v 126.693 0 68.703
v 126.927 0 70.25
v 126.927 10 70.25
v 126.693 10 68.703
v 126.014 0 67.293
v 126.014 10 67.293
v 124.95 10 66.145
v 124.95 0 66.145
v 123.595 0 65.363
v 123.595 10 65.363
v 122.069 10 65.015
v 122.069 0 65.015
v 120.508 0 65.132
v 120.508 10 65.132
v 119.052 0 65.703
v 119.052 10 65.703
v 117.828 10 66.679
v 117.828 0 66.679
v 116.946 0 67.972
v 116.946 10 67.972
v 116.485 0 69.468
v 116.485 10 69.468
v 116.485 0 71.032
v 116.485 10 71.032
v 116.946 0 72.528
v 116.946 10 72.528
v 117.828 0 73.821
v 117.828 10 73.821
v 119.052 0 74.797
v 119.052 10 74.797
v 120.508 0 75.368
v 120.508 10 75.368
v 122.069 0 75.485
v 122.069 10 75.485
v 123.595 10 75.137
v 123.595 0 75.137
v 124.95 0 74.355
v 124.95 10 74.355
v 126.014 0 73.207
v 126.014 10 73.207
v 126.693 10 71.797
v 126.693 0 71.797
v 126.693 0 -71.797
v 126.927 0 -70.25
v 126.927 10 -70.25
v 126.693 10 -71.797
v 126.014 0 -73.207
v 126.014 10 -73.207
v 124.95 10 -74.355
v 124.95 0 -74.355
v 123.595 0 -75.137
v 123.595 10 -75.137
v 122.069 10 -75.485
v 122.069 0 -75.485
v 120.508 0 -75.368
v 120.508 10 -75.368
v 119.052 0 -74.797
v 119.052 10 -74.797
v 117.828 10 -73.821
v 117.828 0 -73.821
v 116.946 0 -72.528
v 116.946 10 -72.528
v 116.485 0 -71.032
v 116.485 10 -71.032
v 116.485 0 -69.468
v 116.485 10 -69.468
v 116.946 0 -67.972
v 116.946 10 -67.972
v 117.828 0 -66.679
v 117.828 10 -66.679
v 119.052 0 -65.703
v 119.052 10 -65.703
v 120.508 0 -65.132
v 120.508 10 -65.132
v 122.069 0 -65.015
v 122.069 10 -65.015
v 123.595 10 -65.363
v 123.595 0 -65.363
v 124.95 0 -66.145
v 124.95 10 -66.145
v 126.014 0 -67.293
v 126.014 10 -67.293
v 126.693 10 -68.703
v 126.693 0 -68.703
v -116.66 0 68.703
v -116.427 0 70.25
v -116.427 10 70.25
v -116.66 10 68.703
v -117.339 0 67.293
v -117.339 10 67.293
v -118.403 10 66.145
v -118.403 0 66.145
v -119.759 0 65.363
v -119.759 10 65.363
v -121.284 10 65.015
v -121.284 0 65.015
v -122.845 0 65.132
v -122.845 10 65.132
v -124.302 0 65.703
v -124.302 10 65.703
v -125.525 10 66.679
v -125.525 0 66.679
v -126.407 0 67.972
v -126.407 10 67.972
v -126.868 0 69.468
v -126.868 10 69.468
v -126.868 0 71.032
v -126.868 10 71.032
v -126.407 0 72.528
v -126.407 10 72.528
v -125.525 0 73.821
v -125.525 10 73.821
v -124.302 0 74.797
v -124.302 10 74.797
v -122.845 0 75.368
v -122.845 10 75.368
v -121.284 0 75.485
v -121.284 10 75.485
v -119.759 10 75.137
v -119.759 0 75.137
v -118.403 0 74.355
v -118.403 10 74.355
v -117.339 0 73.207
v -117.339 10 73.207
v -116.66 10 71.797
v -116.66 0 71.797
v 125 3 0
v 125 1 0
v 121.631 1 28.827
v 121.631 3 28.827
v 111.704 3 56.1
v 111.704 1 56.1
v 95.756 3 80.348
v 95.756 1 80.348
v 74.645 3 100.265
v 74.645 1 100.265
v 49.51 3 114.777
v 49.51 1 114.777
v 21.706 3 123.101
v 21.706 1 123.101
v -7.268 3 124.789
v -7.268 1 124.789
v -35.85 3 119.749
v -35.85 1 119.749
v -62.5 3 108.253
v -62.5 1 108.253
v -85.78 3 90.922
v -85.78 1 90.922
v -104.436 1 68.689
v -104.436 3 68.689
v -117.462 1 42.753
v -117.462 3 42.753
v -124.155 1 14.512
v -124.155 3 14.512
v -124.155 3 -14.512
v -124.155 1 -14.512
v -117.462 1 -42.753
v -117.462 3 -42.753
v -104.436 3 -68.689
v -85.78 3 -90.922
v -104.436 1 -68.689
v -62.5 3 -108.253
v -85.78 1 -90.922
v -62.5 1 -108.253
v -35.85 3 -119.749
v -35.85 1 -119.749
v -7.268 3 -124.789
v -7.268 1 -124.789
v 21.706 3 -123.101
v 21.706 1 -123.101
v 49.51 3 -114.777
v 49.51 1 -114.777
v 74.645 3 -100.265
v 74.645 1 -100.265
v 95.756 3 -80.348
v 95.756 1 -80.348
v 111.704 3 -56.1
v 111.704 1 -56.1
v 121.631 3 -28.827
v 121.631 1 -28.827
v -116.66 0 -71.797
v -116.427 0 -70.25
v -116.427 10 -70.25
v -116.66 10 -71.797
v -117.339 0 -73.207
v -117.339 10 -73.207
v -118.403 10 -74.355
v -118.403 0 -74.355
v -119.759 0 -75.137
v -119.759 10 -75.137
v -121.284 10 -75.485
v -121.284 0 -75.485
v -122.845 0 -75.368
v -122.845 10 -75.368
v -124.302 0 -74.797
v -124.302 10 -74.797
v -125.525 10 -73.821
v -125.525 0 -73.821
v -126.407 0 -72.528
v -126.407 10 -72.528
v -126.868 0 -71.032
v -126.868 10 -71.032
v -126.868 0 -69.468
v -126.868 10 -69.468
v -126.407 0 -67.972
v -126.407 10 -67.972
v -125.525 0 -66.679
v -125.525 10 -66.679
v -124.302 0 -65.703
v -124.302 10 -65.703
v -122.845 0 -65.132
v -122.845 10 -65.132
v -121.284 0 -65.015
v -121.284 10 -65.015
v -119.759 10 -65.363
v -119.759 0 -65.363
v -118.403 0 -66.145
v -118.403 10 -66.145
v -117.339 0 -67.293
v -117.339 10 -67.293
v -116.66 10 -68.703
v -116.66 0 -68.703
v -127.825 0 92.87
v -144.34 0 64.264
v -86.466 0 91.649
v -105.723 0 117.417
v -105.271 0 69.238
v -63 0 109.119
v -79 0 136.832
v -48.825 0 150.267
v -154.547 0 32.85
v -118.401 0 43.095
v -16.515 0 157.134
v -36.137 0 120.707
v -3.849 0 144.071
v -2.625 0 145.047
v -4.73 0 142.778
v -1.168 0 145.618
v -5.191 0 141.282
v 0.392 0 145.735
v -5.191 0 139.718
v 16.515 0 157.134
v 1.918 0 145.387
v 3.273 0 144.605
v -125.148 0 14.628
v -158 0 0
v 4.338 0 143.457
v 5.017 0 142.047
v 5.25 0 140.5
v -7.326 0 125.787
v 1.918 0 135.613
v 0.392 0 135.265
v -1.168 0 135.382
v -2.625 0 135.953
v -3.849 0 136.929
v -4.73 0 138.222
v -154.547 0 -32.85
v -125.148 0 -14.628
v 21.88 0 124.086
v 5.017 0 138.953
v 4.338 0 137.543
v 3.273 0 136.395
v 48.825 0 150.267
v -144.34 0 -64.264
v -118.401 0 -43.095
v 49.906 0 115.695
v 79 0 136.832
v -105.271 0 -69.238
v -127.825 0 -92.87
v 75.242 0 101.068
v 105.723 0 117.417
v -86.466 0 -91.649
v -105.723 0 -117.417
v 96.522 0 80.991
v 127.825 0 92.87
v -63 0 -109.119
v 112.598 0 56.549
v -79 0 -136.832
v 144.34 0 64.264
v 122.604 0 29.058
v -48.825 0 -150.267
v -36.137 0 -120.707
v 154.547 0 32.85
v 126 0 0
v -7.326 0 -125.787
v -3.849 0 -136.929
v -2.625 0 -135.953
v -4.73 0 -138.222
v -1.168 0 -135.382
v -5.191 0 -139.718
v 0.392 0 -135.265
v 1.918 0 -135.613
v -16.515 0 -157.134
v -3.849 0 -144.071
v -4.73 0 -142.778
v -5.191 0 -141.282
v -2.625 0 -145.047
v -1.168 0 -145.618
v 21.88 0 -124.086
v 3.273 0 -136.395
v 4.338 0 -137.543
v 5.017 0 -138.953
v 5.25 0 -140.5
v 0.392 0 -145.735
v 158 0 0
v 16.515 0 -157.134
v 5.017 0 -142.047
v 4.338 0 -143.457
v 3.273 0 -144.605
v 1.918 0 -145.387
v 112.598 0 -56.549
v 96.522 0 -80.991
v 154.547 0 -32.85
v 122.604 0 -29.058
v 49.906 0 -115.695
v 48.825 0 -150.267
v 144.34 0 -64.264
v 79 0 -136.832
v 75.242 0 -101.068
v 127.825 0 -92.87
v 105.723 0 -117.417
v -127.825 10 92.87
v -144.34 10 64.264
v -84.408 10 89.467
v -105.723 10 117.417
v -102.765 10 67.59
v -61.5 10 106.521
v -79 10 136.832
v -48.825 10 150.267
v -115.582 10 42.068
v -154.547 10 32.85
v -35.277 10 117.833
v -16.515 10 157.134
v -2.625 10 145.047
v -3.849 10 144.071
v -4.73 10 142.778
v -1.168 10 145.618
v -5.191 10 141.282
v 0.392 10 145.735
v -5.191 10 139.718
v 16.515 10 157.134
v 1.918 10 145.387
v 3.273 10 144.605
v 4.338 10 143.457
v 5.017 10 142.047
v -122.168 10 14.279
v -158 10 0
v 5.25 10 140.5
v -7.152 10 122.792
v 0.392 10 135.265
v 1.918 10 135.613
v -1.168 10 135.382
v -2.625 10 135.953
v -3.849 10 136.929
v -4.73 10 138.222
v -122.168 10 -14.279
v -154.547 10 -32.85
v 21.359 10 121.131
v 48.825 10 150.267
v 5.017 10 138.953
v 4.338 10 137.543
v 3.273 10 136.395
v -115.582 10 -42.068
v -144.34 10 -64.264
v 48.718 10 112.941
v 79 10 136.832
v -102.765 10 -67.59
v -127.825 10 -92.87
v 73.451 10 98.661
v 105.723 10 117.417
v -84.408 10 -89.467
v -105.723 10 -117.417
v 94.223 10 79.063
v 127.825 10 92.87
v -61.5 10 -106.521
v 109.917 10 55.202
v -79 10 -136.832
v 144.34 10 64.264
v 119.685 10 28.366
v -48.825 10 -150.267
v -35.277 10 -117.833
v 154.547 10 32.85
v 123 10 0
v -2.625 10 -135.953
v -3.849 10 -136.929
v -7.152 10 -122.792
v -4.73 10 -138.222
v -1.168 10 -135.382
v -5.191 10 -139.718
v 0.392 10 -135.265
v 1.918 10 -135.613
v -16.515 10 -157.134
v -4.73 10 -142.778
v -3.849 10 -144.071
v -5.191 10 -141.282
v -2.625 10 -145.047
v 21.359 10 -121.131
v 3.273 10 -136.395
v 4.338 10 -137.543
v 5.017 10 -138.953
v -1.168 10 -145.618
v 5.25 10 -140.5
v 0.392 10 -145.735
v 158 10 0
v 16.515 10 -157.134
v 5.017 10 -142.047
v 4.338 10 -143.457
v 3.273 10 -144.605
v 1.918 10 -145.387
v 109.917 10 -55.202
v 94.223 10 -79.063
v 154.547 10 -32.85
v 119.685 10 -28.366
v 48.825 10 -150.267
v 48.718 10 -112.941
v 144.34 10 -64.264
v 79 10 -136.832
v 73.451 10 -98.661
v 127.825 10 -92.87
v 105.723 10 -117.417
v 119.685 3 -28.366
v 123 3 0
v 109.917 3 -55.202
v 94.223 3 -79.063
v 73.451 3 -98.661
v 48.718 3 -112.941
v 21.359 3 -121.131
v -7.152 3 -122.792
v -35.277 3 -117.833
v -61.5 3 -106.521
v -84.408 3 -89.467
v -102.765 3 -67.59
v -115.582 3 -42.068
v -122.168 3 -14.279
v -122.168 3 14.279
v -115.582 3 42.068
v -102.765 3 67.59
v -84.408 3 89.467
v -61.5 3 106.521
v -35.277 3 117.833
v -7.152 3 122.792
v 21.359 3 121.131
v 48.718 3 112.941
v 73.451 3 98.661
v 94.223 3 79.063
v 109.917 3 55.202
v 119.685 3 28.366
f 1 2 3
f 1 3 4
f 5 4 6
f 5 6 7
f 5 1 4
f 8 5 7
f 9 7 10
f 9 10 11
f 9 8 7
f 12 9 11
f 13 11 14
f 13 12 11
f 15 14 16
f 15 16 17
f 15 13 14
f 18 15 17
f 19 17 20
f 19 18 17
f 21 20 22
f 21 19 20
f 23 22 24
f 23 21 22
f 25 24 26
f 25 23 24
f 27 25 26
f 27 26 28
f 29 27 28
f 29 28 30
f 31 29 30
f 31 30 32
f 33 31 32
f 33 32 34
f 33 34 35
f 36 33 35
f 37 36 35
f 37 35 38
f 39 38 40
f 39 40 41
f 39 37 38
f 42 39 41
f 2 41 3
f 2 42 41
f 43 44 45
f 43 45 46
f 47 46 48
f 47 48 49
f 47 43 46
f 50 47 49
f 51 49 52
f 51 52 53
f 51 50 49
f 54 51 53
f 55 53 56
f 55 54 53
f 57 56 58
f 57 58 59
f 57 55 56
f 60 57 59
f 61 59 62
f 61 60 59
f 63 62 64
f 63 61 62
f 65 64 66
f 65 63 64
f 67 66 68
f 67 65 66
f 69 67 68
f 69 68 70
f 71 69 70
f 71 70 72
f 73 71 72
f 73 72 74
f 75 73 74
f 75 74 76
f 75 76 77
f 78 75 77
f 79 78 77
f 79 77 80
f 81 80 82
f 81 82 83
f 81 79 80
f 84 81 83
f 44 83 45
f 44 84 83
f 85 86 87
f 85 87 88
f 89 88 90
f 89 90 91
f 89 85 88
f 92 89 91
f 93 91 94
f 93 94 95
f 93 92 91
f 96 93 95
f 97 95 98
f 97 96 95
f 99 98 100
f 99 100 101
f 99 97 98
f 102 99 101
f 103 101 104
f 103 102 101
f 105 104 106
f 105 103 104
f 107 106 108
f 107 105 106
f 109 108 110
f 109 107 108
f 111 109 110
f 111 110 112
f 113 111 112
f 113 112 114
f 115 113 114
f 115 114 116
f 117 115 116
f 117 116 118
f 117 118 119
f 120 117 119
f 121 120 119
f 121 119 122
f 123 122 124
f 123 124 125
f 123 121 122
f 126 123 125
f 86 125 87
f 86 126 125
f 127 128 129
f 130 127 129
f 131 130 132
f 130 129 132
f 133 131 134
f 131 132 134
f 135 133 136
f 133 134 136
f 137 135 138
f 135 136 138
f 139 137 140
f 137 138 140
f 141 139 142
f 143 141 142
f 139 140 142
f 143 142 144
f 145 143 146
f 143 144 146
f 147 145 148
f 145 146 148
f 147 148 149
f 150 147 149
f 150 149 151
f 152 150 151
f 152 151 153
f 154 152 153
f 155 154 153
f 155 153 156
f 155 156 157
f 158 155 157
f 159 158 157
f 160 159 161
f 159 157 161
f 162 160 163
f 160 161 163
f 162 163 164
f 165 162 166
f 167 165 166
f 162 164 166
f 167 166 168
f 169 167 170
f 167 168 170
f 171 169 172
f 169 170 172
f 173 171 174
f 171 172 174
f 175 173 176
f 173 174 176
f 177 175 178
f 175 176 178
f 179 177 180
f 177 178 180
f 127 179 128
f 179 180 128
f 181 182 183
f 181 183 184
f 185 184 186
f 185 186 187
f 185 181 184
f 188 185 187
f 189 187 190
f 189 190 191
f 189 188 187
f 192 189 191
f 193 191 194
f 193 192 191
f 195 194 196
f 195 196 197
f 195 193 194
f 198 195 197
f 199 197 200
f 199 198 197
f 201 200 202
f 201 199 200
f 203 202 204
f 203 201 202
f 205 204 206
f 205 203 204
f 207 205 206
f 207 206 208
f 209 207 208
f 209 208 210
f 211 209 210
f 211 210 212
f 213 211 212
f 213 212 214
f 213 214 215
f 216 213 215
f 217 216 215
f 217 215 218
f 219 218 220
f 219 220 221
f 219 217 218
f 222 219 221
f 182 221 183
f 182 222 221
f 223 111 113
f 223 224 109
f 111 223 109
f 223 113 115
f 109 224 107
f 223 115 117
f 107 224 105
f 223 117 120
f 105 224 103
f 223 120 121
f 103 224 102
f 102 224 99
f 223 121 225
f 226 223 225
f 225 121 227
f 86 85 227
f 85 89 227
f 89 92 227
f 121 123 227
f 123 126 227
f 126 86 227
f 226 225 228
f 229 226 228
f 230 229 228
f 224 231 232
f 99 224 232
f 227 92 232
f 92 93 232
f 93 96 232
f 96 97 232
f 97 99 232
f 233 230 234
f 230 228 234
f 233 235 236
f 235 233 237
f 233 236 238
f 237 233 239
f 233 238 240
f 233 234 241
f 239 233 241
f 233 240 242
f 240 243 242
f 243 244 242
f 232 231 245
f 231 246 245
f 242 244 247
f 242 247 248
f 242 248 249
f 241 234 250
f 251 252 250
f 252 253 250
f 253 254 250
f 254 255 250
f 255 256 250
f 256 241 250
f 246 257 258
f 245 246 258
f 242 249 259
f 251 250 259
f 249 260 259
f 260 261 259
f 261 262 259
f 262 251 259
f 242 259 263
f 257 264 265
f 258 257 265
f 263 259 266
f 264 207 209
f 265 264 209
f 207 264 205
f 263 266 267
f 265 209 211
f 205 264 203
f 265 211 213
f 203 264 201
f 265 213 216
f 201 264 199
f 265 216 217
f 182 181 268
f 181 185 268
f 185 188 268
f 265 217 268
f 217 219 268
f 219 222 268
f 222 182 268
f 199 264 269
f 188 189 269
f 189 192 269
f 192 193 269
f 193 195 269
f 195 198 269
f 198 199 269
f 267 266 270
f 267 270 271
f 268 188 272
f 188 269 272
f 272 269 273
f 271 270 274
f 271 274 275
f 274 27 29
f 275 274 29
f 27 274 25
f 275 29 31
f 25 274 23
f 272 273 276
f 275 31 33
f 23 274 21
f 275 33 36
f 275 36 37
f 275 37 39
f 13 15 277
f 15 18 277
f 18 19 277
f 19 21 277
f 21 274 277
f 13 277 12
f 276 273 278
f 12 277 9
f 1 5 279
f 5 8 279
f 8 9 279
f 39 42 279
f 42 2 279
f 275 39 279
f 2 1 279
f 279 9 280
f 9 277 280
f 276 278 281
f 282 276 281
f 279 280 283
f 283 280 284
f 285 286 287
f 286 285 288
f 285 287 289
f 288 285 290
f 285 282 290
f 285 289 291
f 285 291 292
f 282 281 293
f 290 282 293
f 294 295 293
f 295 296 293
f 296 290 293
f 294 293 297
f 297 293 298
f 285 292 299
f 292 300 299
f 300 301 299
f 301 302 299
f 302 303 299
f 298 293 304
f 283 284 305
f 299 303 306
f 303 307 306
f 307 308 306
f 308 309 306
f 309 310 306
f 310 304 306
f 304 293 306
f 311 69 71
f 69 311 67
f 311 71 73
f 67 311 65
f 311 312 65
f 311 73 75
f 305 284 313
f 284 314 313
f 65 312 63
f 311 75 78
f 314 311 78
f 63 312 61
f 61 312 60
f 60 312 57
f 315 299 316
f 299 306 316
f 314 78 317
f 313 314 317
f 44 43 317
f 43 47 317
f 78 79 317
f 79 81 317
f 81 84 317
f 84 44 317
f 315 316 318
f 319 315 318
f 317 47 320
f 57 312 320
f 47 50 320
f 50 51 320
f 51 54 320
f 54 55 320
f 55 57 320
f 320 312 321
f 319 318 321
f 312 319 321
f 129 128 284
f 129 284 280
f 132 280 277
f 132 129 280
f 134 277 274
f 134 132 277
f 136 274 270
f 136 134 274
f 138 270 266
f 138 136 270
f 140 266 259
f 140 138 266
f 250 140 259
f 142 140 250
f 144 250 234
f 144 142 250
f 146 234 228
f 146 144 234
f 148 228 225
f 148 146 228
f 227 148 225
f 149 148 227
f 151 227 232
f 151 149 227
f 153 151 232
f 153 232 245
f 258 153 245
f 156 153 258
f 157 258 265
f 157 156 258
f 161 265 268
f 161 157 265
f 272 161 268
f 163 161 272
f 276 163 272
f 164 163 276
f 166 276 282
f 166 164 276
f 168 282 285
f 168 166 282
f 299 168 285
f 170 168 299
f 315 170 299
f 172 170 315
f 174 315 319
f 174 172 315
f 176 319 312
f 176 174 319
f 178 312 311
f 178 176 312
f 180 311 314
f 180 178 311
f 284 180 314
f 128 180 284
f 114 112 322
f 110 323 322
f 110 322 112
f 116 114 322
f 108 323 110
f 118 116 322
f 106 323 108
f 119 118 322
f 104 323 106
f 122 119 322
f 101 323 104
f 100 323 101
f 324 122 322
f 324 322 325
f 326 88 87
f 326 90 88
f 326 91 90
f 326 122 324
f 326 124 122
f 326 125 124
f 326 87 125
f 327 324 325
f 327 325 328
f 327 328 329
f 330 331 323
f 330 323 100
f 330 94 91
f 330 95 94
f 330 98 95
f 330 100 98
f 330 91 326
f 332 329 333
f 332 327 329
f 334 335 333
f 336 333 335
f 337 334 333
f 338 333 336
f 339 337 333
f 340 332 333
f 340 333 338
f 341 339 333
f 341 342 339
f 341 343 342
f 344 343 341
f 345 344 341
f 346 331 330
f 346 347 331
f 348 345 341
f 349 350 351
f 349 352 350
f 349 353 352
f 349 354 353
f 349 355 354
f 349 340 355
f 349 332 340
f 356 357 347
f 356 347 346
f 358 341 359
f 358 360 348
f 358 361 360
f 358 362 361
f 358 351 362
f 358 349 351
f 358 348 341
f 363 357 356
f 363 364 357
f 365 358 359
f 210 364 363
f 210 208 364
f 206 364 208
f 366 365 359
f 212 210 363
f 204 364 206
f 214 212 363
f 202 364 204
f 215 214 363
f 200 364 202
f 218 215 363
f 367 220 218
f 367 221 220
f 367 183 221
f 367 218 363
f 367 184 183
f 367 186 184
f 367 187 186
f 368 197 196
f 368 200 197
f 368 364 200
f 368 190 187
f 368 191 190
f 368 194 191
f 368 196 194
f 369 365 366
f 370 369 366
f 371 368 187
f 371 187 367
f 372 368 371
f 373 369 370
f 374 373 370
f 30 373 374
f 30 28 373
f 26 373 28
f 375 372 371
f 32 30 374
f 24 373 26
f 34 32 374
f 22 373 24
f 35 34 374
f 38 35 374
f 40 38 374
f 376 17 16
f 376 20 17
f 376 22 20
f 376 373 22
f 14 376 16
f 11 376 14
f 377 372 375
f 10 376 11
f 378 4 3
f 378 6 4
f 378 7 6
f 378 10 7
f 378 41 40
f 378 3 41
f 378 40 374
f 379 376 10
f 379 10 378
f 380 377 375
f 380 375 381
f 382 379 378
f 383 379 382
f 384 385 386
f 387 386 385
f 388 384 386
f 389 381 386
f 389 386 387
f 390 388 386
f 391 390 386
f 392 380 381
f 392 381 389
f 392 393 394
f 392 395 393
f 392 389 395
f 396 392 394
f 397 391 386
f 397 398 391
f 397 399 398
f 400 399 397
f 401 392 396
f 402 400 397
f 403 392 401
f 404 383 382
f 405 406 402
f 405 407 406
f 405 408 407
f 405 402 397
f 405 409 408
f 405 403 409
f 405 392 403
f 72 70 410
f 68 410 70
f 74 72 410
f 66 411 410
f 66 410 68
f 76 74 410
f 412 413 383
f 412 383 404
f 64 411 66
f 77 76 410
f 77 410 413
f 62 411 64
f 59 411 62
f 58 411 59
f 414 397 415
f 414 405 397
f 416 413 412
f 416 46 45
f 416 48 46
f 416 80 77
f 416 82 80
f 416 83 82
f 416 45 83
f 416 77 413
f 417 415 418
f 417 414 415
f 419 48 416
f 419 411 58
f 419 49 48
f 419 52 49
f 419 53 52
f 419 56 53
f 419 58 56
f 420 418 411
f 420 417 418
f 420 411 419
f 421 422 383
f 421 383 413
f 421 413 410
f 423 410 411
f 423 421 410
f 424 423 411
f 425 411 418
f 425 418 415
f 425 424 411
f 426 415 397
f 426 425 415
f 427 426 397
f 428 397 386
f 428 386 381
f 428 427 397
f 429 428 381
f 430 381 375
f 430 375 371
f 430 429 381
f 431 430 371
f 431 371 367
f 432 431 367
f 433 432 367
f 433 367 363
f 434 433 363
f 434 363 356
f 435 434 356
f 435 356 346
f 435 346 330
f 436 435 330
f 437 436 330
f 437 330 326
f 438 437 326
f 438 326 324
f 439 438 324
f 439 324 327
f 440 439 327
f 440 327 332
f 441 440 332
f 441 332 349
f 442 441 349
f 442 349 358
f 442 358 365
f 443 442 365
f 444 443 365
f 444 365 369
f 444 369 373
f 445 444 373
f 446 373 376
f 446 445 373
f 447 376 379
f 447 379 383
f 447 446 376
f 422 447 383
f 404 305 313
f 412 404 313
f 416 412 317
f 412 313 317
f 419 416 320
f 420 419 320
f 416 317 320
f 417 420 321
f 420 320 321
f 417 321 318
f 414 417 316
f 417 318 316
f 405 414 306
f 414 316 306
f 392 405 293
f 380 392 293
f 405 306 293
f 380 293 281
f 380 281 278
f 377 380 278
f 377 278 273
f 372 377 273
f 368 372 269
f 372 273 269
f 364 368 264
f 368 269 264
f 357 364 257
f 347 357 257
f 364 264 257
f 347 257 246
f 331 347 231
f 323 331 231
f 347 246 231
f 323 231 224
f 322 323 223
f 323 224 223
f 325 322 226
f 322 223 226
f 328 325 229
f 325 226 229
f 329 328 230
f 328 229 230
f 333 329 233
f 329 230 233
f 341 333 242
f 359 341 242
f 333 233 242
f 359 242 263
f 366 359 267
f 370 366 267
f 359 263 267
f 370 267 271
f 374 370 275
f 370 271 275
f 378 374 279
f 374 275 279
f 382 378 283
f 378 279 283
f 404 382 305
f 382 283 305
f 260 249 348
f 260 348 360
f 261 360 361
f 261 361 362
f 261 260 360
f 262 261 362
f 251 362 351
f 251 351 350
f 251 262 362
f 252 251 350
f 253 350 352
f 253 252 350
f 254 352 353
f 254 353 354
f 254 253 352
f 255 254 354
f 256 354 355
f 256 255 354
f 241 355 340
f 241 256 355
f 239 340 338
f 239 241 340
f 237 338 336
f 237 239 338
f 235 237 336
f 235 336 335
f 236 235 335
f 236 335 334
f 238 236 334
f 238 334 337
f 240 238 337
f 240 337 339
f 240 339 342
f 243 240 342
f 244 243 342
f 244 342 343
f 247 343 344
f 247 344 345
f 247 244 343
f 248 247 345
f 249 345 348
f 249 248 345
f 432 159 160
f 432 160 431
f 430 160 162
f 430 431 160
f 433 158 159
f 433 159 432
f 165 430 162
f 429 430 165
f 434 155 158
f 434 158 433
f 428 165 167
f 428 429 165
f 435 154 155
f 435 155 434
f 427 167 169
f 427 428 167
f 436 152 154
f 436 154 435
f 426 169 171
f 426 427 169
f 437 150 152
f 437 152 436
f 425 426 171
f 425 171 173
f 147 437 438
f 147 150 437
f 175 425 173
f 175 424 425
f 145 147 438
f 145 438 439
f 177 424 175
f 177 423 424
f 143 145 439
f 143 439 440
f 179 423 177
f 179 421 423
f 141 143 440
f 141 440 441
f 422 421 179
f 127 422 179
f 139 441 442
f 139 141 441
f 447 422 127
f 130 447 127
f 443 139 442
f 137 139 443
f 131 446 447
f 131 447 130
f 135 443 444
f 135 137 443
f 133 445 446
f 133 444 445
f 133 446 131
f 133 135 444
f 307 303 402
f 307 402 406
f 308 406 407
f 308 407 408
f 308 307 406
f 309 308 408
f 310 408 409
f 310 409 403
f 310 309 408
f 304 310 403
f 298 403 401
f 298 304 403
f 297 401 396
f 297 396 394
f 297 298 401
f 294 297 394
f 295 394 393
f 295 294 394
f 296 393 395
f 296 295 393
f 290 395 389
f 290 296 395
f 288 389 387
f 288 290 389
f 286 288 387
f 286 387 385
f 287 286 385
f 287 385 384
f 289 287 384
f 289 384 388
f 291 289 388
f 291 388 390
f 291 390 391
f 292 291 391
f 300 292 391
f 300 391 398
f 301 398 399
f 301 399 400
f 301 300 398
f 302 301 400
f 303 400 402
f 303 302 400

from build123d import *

# Parameters (mm, degrees)
SKETCH1_R           = 158
SKETCH1_R_2         = 123
SKETCH1_R_3         = 5.25
BOSS_EXTRUDE1_DEPTH = 10
SKETCH2_R           = 125
CUT_EXTRUDE1_DEPTH  = 3
CHAMFER1_SIZE       = 1


with BuildPart() as part:
    # Sketch1 → Boss-Extrude1 (new body)
    with BuildSketch(Plane(origin=(0, 0, 0), x_dir=(1, 0, 0), z_dir=(0, 1, 0))):
        Circle(SKETCH1_R)
        Circle(SKETCH1_R_2, mode=Mode.SUBTRACT)
        with Locations((0, 140.5)):
            Circle(SKETCH1_R_3, mode=Mode.SUBTRACT)
        with Locations((121.676569232, 70.25)):
            Circle(SKETCH1_R_3, mode=Mode.SUBTRACT)
        with Locations((121.676569232, -70.25)):
            Circle(SKETCH1_R_3, mode=Mode.SUBTRACT)
        with Locations((0, -140.5)):
            Circle(SKETCH1_R_3, mode=Mode.SUBTRACT)
        with Locations((-121.676569232, -70.25)):
            Circle(SKETCH1_R_3, mode=Mode.SUBTRACT)
        with Locations((-121.676569232, 70.25)):
            Circle(SKETCH1_R_3, mode=Mode.SUBTRACT)
    extrude(amount=BOSS_EXTRUDE1_DEPTH)

    # Sketch2 → Cut-Extrude1 (cut)
    with BuildSketch(Plane.XZ):
        Circle(SKETCH2_R)
    extrude(amount=-CUT_EXTRUDE1_DEPTH, mode=Mode.SUBTRACT)

    # Chamfer1
    chamfer1_edges = [part.edges().sort_by_distance(p)[0] for p in [
        (-125, 0, 0),
    ]]
    chamfer(chamfer1_edges, length=CHAMFER1_SIZE)


solid = part.part
